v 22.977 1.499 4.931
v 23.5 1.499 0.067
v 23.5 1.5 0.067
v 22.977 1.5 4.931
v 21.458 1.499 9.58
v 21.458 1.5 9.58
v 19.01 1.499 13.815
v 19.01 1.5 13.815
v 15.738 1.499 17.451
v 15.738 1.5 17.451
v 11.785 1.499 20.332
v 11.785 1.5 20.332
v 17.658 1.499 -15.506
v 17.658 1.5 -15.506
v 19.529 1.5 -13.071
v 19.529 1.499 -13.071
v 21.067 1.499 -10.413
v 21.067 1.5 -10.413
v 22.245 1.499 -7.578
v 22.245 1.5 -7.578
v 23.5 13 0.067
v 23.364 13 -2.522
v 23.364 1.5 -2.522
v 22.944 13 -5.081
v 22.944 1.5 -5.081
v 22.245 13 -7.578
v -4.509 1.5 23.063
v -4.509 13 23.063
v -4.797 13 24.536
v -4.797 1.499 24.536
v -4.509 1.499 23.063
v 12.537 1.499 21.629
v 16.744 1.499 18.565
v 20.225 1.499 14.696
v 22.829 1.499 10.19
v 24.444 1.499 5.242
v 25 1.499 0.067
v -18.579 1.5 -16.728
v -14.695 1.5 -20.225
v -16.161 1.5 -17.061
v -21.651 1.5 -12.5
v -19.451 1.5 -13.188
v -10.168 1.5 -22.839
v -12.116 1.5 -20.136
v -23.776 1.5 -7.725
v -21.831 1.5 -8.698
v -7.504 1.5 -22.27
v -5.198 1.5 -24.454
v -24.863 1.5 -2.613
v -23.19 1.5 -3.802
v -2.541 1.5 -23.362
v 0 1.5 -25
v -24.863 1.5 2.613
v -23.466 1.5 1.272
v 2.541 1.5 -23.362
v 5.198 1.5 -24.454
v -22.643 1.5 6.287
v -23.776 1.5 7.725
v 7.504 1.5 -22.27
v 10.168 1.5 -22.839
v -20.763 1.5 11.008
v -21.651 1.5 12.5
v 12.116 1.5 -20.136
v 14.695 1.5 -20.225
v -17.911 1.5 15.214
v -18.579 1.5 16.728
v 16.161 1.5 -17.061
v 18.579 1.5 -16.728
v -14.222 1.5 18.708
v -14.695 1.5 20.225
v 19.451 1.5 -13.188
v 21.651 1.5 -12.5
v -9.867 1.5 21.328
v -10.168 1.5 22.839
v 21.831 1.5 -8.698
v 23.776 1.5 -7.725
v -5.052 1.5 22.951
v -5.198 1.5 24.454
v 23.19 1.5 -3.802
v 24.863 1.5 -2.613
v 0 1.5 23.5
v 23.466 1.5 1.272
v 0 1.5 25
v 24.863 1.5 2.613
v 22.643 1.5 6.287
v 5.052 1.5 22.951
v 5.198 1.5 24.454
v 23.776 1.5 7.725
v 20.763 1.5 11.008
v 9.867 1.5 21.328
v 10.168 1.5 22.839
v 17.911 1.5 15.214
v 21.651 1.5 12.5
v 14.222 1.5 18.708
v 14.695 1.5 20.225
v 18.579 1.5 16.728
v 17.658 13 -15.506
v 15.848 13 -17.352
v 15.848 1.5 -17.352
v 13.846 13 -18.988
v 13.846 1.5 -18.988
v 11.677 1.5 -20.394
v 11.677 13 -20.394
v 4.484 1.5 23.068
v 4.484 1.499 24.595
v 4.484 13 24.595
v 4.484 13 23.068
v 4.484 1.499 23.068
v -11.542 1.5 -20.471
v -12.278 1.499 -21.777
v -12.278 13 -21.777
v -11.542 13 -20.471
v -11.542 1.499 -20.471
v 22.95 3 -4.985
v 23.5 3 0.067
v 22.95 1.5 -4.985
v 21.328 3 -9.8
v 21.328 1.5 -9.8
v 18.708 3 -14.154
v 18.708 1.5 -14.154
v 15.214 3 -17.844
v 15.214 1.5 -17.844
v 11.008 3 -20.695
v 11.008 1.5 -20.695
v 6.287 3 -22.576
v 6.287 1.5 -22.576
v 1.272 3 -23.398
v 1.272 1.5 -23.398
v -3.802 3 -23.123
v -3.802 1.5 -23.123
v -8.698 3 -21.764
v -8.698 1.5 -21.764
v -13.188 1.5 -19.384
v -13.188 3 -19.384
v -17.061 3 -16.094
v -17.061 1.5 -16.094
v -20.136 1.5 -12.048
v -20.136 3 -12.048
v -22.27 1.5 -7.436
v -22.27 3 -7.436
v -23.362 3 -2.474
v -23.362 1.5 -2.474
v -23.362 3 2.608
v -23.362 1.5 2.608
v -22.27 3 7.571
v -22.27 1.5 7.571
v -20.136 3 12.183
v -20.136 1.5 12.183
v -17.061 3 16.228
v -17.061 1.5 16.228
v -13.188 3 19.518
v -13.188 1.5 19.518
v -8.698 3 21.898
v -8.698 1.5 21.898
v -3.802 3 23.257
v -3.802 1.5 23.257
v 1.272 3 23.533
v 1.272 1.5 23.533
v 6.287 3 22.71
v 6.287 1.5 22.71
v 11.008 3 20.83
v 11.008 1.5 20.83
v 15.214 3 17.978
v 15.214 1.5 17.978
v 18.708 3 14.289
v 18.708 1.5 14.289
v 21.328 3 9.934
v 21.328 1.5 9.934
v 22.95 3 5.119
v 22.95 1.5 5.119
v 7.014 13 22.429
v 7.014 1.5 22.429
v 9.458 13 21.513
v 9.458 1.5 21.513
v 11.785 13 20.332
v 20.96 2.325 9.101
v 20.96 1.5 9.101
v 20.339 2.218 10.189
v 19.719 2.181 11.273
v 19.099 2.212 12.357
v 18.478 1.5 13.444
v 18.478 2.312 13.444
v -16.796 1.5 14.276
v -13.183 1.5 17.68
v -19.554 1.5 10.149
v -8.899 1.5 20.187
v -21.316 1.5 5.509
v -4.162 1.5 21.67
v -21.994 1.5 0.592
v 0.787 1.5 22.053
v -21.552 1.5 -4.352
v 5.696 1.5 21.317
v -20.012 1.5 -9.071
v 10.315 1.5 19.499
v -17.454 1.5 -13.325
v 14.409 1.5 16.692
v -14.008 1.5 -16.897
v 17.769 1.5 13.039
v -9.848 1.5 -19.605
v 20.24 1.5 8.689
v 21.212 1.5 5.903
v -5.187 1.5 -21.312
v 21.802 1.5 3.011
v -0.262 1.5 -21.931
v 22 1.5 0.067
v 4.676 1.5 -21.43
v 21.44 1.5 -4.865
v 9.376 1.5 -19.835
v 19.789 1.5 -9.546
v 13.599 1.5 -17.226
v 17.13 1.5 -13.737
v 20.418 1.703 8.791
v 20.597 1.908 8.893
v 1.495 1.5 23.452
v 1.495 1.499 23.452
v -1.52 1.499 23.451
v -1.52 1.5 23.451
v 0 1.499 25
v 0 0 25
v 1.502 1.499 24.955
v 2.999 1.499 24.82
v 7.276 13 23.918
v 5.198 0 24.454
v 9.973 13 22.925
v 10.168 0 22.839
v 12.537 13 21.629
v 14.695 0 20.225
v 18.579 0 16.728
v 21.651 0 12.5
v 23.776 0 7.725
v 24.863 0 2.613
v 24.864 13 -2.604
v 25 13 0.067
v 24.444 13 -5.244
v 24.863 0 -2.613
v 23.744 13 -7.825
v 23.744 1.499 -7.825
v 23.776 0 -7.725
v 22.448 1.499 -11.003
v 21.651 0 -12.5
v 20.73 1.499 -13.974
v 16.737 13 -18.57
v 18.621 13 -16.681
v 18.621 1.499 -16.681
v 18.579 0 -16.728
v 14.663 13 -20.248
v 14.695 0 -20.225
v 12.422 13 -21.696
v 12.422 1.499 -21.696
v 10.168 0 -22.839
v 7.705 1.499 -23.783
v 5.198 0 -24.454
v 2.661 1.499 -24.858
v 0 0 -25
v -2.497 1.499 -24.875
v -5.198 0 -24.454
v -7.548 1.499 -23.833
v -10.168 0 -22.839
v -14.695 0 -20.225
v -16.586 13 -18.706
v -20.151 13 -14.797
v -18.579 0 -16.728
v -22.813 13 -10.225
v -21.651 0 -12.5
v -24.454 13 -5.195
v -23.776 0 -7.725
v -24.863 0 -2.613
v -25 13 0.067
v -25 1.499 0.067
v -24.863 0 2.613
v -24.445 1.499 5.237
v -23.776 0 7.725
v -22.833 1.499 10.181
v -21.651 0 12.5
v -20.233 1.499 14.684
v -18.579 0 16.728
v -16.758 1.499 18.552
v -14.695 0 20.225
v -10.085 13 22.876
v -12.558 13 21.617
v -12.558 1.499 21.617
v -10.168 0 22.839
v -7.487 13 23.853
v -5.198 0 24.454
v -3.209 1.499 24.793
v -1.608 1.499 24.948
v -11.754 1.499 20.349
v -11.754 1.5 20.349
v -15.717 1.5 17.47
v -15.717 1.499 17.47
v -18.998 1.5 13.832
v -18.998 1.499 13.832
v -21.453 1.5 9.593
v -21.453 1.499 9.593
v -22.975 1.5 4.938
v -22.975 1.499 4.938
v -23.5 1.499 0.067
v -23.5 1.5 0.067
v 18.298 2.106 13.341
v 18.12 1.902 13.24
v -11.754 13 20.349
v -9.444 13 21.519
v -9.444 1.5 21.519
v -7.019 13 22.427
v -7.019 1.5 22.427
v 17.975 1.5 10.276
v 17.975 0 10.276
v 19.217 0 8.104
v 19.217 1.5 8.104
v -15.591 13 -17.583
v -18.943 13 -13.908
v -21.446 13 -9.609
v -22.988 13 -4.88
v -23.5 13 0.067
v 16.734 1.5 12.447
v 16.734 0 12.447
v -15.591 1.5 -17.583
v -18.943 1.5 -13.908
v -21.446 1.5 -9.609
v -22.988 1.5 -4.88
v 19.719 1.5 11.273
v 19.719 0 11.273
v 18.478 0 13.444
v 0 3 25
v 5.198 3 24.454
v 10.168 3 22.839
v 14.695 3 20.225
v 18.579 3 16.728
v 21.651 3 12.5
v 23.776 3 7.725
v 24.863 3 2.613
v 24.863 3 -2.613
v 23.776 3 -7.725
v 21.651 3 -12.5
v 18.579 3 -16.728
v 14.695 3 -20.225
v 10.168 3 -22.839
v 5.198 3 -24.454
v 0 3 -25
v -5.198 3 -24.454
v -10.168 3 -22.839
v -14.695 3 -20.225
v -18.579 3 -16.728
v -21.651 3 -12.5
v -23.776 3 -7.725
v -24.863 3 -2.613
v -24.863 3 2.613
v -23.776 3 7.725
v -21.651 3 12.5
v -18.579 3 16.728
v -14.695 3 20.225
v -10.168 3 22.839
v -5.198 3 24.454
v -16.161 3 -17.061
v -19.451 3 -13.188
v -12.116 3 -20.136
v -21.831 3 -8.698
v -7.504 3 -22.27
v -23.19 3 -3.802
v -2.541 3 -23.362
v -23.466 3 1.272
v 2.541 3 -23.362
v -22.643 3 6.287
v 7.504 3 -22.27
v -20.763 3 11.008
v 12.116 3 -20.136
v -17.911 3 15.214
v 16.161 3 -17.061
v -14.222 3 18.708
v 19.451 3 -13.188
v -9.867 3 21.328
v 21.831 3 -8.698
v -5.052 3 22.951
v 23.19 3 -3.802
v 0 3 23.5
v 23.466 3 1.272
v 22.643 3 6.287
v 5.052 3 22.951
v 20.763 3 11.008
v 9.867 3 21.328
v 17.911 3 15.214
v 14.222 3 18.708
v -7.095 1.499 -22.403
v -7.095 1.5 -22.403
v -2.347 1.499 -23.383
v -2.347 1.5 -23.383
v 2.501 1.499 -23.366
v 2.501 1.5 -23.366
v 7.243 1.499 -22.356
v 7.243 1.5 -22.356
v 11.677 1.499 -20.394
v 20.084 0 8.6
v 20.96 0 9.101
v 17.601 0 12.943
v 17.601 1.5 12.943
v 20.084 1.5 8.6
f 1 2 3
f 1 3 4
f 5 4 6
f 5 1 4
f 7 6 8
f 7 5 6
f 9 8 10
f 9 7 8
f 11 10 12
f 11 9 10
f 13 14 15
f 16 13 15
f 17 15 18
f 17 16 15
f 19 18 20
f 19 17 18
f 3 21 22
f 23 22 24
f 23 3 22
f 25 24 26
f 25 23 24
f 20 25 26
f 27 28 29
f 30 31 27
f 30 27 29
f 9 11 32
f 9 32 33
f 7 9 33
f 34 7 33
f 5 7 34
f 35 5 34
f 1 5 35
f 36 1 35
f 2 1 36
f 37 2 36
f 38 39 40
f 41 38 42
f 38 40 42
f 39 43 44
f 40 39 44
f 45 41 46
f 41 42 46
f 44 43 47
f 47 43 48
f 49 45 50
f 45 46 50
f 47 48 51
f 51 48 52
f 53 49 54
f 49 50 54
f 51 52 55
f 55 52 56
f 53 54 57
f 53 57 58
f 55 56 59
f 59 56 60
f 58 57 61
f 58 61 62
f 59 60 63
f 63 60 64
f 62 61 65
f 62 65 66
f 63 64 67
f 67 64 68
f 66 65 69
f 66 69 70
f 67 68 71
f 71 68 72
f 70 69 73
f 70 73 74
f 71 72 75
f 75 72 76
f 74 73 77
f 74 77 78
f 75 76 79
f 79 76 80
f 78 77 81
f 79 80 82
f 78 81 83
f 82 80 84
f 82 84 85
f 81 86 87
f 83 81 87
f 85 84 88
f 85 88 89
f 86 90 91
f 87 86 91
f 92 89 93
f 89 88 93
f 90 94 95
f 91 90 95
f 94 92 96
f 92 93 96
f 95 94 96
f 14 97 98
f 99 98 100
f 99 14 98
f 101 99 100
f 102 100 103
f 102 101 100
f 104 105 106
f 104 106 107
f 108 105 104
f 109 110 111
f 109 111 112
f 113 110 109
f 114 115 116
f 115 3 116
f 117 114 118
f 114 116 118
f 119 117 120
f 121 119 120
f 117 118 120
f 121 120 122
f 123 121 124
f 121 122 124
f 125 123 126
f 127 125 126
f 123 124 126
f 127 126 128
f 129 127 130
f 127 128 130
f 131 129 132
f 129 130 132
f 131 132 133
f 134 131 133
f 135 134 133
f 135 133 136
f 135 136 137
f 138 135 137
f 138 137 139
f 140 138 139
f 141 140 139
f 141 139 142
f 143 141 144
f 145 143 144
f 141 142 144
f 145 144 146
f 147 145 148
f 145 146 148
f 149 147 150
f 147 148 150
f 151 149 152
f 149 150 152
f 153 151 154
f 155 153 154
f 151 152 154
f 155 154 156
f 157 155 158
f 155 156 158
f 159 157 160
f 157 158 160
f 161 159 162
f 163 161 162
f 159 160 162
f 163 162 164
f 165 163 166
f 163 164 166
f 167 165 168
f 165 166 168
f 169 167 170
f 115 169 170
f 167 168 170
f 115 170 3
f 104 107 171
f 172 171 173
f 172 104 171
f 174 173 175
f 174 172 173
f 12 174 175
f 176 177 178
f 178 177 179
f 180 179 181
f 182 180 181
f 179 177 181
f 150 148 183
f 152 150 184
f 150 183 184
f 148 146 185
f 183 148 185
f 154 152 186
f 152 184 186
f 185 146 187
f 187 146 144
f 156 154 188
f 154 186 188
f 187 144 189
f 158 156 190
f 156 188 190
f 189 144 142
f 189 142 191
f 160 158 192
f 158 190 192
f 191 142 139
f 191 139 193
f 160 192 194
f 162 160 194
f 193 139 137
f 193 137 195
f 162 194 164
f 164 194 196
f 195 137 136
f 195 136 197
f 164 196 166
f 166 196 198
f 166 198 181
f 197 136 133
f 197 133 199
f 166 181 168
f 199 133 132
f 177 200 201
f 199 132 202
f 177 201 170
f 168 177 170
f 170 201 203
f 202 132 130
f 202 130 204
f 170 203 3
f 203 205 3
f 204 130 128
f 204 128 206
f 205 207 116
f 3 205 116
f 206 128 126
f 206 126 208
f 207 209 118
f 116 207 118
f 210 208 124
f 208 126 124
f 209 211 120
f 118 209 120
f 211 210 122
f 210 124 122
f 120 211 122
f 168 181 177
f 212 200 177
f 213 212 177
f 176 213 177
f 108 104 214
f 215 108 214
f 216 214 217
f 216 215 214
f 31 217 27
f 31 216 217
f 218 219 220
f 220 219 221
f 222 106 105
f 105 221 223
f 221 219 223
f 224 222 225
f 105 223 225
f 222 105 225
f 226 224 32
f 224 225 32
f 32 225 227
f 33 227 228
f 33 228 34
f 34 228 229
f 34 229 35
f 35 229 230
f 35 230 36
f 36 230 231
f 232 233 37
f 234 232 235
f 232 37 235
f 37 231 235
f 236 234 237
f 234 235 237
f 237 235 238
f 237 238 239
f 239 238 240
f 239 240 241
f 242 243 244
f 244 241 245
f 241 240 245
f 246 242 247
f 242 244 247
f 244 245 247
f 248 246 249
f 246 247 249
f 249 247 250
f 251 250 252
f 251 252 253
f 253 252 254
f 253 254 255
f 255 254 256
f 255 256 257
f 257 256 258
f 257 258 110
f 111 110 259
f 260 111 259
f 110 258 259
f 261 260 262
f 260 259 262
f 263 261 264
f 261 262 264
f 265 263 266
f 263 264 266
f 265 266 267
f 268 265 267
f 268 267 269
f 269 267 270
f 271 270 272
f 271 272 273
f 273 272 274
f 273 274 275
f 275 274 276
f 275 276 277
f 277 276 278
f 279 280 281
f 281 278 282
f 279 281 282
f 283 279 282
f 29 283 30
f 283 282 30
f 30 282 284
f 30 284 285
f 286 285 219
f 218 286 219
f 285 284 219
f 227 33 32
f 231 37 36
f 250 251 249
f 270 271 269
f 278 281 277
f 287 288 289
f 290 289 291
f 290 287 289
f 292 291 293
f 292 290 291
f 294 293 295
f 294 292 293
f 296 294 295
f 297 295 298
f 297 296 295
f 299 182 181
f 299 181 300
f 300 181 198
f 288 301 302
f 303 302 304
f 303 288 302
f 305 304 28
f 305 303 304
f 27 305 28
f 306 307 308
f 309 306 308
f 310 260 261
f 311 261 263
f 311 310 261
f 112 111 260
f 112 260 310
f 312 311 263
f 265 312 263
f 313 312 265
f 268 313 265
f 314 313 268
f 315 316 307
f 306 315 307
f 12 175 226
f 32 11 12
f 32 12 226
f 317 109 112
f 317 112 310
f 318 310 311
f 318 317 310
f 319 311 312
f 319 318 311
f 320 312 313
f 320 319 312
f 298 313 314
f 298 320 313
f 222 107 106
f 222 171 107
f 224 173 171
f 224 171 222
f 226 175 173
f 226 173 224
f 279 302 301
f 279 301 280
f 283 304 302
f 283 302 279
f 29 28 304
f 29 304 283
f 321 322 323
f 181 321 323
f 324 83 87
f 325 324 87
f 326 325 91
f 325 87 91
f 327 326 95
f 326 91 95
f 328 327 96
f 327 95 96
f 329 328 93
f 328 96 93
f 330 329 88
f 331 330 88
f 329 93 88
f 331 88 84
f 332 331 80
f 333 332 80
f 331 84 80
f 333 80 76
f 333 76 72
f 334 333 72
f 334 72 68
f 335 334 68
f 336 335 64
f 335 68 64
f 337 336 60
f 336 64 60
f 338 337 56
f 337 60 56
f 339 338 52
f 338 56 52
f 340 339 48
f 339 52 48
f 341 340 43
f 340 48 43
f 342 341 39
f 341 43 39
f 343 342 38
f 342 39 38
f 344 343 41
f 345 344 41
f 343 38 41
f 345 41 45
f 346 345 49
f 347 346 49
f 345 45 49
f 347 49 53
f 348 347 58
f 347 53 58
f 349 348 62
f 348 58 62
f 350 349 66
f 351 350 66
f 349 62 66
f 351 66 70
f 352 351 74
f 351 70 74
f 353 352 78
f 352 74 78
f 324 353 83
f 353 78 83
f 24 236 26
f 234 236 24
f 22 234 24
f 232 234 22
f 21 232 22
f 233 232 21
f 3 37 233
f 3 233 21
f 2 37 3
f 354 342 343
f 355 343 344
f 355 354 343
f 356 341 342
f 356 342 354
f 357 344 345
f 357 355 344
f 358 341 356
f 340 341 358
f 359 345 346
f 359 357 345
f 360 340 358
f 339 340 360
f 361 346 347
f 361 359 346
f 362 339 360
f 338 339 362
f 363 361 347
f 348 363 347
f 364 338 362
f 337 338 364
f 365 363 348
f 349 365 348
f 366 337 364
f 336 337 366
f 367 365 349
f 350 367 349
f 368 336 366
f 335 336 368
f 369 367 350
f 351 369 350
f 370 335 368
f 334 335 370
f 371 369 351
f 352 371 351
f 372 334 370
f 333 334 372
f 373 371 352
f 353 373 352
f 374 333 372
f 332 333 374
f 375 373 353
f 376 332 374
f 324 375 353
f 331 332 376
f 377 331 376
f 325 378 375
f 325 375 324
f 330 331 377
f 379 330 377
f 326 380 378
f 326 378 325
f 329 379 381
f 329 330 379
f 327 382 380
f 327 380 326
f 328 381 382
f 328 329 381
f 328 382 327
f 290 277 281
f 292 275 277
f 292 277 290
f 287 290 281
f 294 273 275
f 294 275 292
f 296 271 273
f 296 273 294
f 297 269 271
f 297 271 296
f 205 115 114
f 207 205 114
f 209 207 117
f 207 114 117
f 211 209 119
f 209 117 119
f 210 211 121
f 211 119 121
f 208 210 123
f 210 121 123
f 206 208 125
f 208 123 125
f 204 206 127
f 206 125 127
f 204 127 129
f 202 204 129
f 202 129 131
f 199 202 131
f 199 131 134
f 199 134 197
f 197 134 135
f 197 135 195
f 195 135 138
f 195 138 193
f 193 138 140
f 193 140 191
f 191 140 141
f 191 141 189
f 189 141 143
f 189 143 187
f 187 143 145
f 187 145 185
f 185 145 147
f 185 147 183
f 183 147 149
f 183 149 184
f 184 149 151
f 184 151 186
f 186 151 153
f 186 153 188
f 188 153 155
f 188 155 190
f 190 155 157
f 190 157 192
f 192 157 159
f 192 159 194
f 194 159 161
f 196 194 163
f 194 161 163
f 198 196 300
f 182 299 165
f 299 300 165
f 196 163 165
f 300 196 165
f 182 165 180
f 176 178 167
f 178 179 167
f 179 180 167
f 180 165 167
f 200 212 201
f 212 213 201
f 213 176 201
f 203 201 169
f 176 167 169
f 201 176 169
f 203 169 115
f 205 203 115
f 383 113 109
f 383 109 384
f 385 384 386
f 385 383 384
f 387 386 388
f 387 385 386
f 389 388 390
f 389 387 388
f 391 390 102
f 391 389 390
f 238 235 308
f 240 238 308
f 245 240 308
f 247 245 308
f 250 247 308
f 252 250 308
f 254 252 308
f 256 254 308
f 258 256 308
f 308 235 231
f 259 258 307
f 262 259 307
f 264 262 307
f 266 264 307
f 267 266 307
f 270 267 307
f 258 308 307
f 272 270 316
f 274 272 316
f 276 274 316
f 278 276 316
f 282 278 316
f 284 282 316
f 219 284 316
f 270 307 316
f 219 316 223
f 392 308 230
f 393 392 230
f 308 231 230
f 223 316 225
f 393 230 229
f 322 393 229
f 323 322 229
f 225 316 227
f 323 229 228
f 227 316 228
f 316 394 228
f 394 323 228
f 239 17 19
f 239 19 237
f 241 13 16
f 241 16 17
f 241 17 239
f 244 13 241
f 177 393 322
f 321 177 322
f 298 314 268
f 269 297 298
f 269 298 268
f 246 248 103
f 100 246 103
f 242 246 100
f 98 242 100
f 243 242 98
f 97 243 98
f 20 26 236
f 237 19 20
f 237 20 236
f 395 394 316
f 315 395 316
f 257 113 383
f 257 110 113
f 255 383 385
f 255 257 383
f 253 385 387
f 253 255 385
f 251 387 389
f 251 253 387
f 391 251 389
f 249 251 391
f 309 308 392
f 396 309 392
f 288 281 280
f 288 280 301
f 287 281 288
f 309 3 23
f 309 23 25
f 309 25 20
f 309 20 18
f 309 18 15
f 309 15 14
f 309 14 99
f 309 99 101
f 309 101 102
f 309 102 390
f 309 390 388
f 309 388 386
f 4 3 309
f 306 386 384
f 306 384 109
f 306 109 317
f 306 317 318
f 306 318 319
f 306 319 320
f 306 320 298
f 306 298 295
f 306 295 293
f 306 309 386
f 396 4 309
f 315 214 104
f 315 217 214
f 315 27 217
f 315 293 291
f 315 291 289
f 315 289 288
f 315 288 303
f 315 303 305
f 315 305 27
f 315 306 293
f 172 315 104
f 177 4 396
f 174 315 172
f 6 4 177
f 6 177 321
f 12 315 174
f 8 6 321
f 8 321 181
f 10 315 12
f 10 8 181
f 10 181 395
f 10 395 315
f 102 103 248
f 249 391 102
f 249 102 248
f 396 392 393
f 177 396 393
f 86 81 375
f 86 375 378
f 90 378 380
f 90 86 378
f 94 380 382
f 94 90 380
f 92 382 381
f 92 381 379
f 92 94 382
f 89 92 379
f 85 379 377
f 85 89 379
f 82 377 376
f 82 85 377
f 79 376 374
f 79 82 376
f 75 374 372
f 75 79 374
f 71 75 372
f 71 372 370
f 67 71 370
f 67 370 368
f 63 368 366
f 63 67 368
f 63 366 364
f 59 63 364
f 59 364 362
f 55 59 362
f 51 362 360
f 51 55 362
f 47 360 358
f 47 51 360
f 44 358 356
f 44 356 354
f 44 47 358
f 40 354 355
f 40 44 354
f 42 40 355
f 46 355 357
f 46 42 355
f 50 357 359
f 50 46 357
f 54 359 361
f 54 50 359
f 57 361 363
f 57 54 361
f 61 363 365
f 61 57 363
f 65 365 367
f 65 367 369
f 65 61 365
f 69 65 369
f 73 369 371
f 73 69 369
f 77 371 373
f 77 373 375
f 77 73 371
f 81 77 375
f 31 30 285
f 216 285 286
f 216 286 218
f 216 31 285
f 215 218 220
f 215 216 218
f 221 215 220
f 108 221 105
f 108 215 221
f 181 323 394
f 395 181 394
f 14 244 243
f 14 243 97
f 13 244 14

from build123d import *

# Parameters (mm, degrees)
SKETCH1_R               = 25
BOSS_EXTRUDE1_DEPTH     = 1.5
BOSS_EXTRUDE2_DEPTH     = 11.5
CUT_EXTRUDE3_DEPTH      = 15
CUT_EXTRUDE3_DEPTH_BACK = 0.001
CUT_EXTRUDE4_DEPTH      = 5.001
SKETCH9_R               = 25
SKETCH9_R_2             = 23.5
BOSS_EXTRUDE4_DEPTH     = 1.5
CUT_EXTRUDE5_DEPTH      = 4.5


with BuildPart() as part:
    # Sketch1 → Boss-Extrude1 (new body)
    with BuildSketch(Plane(origin=(0, 0, 0), x_dir=(1, 0, 0), z_dir=(0, 1, 0))):
        Circle(SKETCH1_R)
    extrude(amount=BOSS_EXTRUDE1_DEPTH)

    # Sketch3 → Boss-Extrude2 (add)
    with BuildSketch(Plane(origin=(0, 1.5, 0), x_dir=(1, 0, 0), z_dir=(0, 1, 0))):
        with BuildLine():
            ThreePointArc((25, 0), (-10.270047641, 22.793115659), (-16.562089716, -18.726910696))
            ThreePointArc((-16.562089716, -18.726910696), (10.270047641, -22.793115659), (25, 0))
        make_face()
        with BuildLine():
            ThreePointArc((23.5, 0), (9.653844782, -21.42552872), (-15.568364333, -17.603296054))
            ThreePointArc((-15.568364333, -17.603296054), (-9.653844782, 21.42552872), (23.5, 0))
        make_face(mode=Mode.SUBTRACT)
    extrude(amount=BOSS_EXTRUDE2_DEPTH)

    # Sketch4 → Cut-Extrude3 (cut, two sides: drawn at the far end of the back side and taken through both)
    with BuildSketch(Plane(origin=(0, 1.5, 0), x_dir=(1, 0, 0), z_dir=(0, 1, 0)).offset(-CUT_EXTRUDE3_DEPTH_BACK)):
        with BuildLine():
            Line((11.784714356, -20.331515132), (12.536930166, -21.629271417))
            ThreePointArc((12.536930166, -21.629271417), (21.64452184, -12.510582494), (24.999909933, -0.067106913))
            Line((24.999909933, -0.067106913), (23.499904184, -0.067106913))
            ThreePointArc((23.499904184, -0.067106913), (20.344842995, -11.761690504), (11.784714356, -20.331515132))
        make_face()
        with BuildLine():
            ThreePointArc((-4.796569027, -24.535544126), (-0.158926829, -24.99949484), (4.48423915, -24.594544095))
            Line((4.48423915, -24.594544095), (4.48423915, -23.068194538))
            ThreePointArc((4.48423915, -23.068194538), (-0.0124988, -23.499996676), (-4.508774886, -23.063411479))
            Line((-4.508774886, -23.063411479), (-4.796569027, -24.535544126))
        make_face()
        with BuildLine():
            ThreePointArc((-24.999909933, -0.067106913), (-21.650665798, -12.49994682), (-12.558177453, -21.616941945))
            Line((-12.558177453, -21.616941945), (-11.753909653, -20.349339249))
            ThreePointArc((-11.753909653, -20.349339249), (-20.335930877, -11.777092823), (-23.499904184, -0.067106913))
            Line((-23.499904184, -0.067106913), (-24.999909933, -0.067106913))
        make_face()
        with BuildLine():
            Line((22.244801118, 7.577520917), (23.743699089, 7.825391591))
            ThreePointArc((23.743699089, 7.825391591), (21.640227627, 12.518008956), (18.621106201, 16.680959321))
            Line((18.621106201, 16.680959321), (17.658496176, 15.505725162))
            ThreePointArc((17.658496176, 15.505725162), (20.341641757, 11.767226123), (22.244801118, 7.577520917))
        make_face()
        with BuildLine():
            ThreePointArc((12.42188042, 21.695549931), (0.082599021, 24.999863548), (-12.27824751, 21.777158632))
            Line((-12.27824751, 21.777158632), (-11.541552659, 20.470529114))
            ThreePointArc((-11.541552659, 20.470529114), (0.07764308, 23.499871735), (11.676567595, 20.393816936))
            Line((11.676567595, 20.393816936), (12.42188042, 21.695549931))
        make_face()
    extrude(amount=CUT_EXTRUDE3_DEPTH + CUT_EXTRUDE3_DEPTH_BACK, mode=Mode.SUBTRACT)

    # Sketch5 → Cut-Extrude4 (cut)
    with BuildSketch(Plane.XZ):
        Polygon((16.733709956, 12.446973803), (19.216503445, 8.104071987), (20.960461392, 9.101075286), (18.477667903, 13.443977102), align=None)
    extrude(amount=-CUT_EXTRUDE4_DEPTH, mode=Mode.SUBTRACT)


with BuildPart() as body_2:
    # Sketch8 → Revolve4 (revolve)
    with BuildSketch(Plane.XY.offset(0.067106913)):
        Polygon((-23.499904184, 3), (-23.499904184, 1.5), (-21.999904184, 1.5), align=None)
    revolve(axis=Axis((0, 0, 0.067106913), (0, 1, 0)))

    # Sketch10 → Cut-Extrude5 (cut)
    with BuildSketch(Plane.XZ):
        Polygon((19.216503445, 8.104071987), (20.960461392, 9.101075286), (18.477667903, 13.443977102), (16.733709956, 12.446973803), align=None)
    extrude(amount=-CUT_EXTRUDE5_DEPTH, mode=Mode.SUBTRACT)


with BuildPart() as body_3:
    # Sketch9 → Boss-Extrude4 (new body)
    with BuildSketch(Plane(origin=(0, 1.5, 0), x_dir=(1, 0, 0), z_dir=(0, 1, 0))):
        Circle(SKETCH9_R)
        Circle(SKETCH9_R_2, mode=Mode.SUBTRACT)
    extrude(amount=BOSS_EXTRUDE4_DEPTH)


solid = Compound([part.part, body_2.part, body_3.part])
